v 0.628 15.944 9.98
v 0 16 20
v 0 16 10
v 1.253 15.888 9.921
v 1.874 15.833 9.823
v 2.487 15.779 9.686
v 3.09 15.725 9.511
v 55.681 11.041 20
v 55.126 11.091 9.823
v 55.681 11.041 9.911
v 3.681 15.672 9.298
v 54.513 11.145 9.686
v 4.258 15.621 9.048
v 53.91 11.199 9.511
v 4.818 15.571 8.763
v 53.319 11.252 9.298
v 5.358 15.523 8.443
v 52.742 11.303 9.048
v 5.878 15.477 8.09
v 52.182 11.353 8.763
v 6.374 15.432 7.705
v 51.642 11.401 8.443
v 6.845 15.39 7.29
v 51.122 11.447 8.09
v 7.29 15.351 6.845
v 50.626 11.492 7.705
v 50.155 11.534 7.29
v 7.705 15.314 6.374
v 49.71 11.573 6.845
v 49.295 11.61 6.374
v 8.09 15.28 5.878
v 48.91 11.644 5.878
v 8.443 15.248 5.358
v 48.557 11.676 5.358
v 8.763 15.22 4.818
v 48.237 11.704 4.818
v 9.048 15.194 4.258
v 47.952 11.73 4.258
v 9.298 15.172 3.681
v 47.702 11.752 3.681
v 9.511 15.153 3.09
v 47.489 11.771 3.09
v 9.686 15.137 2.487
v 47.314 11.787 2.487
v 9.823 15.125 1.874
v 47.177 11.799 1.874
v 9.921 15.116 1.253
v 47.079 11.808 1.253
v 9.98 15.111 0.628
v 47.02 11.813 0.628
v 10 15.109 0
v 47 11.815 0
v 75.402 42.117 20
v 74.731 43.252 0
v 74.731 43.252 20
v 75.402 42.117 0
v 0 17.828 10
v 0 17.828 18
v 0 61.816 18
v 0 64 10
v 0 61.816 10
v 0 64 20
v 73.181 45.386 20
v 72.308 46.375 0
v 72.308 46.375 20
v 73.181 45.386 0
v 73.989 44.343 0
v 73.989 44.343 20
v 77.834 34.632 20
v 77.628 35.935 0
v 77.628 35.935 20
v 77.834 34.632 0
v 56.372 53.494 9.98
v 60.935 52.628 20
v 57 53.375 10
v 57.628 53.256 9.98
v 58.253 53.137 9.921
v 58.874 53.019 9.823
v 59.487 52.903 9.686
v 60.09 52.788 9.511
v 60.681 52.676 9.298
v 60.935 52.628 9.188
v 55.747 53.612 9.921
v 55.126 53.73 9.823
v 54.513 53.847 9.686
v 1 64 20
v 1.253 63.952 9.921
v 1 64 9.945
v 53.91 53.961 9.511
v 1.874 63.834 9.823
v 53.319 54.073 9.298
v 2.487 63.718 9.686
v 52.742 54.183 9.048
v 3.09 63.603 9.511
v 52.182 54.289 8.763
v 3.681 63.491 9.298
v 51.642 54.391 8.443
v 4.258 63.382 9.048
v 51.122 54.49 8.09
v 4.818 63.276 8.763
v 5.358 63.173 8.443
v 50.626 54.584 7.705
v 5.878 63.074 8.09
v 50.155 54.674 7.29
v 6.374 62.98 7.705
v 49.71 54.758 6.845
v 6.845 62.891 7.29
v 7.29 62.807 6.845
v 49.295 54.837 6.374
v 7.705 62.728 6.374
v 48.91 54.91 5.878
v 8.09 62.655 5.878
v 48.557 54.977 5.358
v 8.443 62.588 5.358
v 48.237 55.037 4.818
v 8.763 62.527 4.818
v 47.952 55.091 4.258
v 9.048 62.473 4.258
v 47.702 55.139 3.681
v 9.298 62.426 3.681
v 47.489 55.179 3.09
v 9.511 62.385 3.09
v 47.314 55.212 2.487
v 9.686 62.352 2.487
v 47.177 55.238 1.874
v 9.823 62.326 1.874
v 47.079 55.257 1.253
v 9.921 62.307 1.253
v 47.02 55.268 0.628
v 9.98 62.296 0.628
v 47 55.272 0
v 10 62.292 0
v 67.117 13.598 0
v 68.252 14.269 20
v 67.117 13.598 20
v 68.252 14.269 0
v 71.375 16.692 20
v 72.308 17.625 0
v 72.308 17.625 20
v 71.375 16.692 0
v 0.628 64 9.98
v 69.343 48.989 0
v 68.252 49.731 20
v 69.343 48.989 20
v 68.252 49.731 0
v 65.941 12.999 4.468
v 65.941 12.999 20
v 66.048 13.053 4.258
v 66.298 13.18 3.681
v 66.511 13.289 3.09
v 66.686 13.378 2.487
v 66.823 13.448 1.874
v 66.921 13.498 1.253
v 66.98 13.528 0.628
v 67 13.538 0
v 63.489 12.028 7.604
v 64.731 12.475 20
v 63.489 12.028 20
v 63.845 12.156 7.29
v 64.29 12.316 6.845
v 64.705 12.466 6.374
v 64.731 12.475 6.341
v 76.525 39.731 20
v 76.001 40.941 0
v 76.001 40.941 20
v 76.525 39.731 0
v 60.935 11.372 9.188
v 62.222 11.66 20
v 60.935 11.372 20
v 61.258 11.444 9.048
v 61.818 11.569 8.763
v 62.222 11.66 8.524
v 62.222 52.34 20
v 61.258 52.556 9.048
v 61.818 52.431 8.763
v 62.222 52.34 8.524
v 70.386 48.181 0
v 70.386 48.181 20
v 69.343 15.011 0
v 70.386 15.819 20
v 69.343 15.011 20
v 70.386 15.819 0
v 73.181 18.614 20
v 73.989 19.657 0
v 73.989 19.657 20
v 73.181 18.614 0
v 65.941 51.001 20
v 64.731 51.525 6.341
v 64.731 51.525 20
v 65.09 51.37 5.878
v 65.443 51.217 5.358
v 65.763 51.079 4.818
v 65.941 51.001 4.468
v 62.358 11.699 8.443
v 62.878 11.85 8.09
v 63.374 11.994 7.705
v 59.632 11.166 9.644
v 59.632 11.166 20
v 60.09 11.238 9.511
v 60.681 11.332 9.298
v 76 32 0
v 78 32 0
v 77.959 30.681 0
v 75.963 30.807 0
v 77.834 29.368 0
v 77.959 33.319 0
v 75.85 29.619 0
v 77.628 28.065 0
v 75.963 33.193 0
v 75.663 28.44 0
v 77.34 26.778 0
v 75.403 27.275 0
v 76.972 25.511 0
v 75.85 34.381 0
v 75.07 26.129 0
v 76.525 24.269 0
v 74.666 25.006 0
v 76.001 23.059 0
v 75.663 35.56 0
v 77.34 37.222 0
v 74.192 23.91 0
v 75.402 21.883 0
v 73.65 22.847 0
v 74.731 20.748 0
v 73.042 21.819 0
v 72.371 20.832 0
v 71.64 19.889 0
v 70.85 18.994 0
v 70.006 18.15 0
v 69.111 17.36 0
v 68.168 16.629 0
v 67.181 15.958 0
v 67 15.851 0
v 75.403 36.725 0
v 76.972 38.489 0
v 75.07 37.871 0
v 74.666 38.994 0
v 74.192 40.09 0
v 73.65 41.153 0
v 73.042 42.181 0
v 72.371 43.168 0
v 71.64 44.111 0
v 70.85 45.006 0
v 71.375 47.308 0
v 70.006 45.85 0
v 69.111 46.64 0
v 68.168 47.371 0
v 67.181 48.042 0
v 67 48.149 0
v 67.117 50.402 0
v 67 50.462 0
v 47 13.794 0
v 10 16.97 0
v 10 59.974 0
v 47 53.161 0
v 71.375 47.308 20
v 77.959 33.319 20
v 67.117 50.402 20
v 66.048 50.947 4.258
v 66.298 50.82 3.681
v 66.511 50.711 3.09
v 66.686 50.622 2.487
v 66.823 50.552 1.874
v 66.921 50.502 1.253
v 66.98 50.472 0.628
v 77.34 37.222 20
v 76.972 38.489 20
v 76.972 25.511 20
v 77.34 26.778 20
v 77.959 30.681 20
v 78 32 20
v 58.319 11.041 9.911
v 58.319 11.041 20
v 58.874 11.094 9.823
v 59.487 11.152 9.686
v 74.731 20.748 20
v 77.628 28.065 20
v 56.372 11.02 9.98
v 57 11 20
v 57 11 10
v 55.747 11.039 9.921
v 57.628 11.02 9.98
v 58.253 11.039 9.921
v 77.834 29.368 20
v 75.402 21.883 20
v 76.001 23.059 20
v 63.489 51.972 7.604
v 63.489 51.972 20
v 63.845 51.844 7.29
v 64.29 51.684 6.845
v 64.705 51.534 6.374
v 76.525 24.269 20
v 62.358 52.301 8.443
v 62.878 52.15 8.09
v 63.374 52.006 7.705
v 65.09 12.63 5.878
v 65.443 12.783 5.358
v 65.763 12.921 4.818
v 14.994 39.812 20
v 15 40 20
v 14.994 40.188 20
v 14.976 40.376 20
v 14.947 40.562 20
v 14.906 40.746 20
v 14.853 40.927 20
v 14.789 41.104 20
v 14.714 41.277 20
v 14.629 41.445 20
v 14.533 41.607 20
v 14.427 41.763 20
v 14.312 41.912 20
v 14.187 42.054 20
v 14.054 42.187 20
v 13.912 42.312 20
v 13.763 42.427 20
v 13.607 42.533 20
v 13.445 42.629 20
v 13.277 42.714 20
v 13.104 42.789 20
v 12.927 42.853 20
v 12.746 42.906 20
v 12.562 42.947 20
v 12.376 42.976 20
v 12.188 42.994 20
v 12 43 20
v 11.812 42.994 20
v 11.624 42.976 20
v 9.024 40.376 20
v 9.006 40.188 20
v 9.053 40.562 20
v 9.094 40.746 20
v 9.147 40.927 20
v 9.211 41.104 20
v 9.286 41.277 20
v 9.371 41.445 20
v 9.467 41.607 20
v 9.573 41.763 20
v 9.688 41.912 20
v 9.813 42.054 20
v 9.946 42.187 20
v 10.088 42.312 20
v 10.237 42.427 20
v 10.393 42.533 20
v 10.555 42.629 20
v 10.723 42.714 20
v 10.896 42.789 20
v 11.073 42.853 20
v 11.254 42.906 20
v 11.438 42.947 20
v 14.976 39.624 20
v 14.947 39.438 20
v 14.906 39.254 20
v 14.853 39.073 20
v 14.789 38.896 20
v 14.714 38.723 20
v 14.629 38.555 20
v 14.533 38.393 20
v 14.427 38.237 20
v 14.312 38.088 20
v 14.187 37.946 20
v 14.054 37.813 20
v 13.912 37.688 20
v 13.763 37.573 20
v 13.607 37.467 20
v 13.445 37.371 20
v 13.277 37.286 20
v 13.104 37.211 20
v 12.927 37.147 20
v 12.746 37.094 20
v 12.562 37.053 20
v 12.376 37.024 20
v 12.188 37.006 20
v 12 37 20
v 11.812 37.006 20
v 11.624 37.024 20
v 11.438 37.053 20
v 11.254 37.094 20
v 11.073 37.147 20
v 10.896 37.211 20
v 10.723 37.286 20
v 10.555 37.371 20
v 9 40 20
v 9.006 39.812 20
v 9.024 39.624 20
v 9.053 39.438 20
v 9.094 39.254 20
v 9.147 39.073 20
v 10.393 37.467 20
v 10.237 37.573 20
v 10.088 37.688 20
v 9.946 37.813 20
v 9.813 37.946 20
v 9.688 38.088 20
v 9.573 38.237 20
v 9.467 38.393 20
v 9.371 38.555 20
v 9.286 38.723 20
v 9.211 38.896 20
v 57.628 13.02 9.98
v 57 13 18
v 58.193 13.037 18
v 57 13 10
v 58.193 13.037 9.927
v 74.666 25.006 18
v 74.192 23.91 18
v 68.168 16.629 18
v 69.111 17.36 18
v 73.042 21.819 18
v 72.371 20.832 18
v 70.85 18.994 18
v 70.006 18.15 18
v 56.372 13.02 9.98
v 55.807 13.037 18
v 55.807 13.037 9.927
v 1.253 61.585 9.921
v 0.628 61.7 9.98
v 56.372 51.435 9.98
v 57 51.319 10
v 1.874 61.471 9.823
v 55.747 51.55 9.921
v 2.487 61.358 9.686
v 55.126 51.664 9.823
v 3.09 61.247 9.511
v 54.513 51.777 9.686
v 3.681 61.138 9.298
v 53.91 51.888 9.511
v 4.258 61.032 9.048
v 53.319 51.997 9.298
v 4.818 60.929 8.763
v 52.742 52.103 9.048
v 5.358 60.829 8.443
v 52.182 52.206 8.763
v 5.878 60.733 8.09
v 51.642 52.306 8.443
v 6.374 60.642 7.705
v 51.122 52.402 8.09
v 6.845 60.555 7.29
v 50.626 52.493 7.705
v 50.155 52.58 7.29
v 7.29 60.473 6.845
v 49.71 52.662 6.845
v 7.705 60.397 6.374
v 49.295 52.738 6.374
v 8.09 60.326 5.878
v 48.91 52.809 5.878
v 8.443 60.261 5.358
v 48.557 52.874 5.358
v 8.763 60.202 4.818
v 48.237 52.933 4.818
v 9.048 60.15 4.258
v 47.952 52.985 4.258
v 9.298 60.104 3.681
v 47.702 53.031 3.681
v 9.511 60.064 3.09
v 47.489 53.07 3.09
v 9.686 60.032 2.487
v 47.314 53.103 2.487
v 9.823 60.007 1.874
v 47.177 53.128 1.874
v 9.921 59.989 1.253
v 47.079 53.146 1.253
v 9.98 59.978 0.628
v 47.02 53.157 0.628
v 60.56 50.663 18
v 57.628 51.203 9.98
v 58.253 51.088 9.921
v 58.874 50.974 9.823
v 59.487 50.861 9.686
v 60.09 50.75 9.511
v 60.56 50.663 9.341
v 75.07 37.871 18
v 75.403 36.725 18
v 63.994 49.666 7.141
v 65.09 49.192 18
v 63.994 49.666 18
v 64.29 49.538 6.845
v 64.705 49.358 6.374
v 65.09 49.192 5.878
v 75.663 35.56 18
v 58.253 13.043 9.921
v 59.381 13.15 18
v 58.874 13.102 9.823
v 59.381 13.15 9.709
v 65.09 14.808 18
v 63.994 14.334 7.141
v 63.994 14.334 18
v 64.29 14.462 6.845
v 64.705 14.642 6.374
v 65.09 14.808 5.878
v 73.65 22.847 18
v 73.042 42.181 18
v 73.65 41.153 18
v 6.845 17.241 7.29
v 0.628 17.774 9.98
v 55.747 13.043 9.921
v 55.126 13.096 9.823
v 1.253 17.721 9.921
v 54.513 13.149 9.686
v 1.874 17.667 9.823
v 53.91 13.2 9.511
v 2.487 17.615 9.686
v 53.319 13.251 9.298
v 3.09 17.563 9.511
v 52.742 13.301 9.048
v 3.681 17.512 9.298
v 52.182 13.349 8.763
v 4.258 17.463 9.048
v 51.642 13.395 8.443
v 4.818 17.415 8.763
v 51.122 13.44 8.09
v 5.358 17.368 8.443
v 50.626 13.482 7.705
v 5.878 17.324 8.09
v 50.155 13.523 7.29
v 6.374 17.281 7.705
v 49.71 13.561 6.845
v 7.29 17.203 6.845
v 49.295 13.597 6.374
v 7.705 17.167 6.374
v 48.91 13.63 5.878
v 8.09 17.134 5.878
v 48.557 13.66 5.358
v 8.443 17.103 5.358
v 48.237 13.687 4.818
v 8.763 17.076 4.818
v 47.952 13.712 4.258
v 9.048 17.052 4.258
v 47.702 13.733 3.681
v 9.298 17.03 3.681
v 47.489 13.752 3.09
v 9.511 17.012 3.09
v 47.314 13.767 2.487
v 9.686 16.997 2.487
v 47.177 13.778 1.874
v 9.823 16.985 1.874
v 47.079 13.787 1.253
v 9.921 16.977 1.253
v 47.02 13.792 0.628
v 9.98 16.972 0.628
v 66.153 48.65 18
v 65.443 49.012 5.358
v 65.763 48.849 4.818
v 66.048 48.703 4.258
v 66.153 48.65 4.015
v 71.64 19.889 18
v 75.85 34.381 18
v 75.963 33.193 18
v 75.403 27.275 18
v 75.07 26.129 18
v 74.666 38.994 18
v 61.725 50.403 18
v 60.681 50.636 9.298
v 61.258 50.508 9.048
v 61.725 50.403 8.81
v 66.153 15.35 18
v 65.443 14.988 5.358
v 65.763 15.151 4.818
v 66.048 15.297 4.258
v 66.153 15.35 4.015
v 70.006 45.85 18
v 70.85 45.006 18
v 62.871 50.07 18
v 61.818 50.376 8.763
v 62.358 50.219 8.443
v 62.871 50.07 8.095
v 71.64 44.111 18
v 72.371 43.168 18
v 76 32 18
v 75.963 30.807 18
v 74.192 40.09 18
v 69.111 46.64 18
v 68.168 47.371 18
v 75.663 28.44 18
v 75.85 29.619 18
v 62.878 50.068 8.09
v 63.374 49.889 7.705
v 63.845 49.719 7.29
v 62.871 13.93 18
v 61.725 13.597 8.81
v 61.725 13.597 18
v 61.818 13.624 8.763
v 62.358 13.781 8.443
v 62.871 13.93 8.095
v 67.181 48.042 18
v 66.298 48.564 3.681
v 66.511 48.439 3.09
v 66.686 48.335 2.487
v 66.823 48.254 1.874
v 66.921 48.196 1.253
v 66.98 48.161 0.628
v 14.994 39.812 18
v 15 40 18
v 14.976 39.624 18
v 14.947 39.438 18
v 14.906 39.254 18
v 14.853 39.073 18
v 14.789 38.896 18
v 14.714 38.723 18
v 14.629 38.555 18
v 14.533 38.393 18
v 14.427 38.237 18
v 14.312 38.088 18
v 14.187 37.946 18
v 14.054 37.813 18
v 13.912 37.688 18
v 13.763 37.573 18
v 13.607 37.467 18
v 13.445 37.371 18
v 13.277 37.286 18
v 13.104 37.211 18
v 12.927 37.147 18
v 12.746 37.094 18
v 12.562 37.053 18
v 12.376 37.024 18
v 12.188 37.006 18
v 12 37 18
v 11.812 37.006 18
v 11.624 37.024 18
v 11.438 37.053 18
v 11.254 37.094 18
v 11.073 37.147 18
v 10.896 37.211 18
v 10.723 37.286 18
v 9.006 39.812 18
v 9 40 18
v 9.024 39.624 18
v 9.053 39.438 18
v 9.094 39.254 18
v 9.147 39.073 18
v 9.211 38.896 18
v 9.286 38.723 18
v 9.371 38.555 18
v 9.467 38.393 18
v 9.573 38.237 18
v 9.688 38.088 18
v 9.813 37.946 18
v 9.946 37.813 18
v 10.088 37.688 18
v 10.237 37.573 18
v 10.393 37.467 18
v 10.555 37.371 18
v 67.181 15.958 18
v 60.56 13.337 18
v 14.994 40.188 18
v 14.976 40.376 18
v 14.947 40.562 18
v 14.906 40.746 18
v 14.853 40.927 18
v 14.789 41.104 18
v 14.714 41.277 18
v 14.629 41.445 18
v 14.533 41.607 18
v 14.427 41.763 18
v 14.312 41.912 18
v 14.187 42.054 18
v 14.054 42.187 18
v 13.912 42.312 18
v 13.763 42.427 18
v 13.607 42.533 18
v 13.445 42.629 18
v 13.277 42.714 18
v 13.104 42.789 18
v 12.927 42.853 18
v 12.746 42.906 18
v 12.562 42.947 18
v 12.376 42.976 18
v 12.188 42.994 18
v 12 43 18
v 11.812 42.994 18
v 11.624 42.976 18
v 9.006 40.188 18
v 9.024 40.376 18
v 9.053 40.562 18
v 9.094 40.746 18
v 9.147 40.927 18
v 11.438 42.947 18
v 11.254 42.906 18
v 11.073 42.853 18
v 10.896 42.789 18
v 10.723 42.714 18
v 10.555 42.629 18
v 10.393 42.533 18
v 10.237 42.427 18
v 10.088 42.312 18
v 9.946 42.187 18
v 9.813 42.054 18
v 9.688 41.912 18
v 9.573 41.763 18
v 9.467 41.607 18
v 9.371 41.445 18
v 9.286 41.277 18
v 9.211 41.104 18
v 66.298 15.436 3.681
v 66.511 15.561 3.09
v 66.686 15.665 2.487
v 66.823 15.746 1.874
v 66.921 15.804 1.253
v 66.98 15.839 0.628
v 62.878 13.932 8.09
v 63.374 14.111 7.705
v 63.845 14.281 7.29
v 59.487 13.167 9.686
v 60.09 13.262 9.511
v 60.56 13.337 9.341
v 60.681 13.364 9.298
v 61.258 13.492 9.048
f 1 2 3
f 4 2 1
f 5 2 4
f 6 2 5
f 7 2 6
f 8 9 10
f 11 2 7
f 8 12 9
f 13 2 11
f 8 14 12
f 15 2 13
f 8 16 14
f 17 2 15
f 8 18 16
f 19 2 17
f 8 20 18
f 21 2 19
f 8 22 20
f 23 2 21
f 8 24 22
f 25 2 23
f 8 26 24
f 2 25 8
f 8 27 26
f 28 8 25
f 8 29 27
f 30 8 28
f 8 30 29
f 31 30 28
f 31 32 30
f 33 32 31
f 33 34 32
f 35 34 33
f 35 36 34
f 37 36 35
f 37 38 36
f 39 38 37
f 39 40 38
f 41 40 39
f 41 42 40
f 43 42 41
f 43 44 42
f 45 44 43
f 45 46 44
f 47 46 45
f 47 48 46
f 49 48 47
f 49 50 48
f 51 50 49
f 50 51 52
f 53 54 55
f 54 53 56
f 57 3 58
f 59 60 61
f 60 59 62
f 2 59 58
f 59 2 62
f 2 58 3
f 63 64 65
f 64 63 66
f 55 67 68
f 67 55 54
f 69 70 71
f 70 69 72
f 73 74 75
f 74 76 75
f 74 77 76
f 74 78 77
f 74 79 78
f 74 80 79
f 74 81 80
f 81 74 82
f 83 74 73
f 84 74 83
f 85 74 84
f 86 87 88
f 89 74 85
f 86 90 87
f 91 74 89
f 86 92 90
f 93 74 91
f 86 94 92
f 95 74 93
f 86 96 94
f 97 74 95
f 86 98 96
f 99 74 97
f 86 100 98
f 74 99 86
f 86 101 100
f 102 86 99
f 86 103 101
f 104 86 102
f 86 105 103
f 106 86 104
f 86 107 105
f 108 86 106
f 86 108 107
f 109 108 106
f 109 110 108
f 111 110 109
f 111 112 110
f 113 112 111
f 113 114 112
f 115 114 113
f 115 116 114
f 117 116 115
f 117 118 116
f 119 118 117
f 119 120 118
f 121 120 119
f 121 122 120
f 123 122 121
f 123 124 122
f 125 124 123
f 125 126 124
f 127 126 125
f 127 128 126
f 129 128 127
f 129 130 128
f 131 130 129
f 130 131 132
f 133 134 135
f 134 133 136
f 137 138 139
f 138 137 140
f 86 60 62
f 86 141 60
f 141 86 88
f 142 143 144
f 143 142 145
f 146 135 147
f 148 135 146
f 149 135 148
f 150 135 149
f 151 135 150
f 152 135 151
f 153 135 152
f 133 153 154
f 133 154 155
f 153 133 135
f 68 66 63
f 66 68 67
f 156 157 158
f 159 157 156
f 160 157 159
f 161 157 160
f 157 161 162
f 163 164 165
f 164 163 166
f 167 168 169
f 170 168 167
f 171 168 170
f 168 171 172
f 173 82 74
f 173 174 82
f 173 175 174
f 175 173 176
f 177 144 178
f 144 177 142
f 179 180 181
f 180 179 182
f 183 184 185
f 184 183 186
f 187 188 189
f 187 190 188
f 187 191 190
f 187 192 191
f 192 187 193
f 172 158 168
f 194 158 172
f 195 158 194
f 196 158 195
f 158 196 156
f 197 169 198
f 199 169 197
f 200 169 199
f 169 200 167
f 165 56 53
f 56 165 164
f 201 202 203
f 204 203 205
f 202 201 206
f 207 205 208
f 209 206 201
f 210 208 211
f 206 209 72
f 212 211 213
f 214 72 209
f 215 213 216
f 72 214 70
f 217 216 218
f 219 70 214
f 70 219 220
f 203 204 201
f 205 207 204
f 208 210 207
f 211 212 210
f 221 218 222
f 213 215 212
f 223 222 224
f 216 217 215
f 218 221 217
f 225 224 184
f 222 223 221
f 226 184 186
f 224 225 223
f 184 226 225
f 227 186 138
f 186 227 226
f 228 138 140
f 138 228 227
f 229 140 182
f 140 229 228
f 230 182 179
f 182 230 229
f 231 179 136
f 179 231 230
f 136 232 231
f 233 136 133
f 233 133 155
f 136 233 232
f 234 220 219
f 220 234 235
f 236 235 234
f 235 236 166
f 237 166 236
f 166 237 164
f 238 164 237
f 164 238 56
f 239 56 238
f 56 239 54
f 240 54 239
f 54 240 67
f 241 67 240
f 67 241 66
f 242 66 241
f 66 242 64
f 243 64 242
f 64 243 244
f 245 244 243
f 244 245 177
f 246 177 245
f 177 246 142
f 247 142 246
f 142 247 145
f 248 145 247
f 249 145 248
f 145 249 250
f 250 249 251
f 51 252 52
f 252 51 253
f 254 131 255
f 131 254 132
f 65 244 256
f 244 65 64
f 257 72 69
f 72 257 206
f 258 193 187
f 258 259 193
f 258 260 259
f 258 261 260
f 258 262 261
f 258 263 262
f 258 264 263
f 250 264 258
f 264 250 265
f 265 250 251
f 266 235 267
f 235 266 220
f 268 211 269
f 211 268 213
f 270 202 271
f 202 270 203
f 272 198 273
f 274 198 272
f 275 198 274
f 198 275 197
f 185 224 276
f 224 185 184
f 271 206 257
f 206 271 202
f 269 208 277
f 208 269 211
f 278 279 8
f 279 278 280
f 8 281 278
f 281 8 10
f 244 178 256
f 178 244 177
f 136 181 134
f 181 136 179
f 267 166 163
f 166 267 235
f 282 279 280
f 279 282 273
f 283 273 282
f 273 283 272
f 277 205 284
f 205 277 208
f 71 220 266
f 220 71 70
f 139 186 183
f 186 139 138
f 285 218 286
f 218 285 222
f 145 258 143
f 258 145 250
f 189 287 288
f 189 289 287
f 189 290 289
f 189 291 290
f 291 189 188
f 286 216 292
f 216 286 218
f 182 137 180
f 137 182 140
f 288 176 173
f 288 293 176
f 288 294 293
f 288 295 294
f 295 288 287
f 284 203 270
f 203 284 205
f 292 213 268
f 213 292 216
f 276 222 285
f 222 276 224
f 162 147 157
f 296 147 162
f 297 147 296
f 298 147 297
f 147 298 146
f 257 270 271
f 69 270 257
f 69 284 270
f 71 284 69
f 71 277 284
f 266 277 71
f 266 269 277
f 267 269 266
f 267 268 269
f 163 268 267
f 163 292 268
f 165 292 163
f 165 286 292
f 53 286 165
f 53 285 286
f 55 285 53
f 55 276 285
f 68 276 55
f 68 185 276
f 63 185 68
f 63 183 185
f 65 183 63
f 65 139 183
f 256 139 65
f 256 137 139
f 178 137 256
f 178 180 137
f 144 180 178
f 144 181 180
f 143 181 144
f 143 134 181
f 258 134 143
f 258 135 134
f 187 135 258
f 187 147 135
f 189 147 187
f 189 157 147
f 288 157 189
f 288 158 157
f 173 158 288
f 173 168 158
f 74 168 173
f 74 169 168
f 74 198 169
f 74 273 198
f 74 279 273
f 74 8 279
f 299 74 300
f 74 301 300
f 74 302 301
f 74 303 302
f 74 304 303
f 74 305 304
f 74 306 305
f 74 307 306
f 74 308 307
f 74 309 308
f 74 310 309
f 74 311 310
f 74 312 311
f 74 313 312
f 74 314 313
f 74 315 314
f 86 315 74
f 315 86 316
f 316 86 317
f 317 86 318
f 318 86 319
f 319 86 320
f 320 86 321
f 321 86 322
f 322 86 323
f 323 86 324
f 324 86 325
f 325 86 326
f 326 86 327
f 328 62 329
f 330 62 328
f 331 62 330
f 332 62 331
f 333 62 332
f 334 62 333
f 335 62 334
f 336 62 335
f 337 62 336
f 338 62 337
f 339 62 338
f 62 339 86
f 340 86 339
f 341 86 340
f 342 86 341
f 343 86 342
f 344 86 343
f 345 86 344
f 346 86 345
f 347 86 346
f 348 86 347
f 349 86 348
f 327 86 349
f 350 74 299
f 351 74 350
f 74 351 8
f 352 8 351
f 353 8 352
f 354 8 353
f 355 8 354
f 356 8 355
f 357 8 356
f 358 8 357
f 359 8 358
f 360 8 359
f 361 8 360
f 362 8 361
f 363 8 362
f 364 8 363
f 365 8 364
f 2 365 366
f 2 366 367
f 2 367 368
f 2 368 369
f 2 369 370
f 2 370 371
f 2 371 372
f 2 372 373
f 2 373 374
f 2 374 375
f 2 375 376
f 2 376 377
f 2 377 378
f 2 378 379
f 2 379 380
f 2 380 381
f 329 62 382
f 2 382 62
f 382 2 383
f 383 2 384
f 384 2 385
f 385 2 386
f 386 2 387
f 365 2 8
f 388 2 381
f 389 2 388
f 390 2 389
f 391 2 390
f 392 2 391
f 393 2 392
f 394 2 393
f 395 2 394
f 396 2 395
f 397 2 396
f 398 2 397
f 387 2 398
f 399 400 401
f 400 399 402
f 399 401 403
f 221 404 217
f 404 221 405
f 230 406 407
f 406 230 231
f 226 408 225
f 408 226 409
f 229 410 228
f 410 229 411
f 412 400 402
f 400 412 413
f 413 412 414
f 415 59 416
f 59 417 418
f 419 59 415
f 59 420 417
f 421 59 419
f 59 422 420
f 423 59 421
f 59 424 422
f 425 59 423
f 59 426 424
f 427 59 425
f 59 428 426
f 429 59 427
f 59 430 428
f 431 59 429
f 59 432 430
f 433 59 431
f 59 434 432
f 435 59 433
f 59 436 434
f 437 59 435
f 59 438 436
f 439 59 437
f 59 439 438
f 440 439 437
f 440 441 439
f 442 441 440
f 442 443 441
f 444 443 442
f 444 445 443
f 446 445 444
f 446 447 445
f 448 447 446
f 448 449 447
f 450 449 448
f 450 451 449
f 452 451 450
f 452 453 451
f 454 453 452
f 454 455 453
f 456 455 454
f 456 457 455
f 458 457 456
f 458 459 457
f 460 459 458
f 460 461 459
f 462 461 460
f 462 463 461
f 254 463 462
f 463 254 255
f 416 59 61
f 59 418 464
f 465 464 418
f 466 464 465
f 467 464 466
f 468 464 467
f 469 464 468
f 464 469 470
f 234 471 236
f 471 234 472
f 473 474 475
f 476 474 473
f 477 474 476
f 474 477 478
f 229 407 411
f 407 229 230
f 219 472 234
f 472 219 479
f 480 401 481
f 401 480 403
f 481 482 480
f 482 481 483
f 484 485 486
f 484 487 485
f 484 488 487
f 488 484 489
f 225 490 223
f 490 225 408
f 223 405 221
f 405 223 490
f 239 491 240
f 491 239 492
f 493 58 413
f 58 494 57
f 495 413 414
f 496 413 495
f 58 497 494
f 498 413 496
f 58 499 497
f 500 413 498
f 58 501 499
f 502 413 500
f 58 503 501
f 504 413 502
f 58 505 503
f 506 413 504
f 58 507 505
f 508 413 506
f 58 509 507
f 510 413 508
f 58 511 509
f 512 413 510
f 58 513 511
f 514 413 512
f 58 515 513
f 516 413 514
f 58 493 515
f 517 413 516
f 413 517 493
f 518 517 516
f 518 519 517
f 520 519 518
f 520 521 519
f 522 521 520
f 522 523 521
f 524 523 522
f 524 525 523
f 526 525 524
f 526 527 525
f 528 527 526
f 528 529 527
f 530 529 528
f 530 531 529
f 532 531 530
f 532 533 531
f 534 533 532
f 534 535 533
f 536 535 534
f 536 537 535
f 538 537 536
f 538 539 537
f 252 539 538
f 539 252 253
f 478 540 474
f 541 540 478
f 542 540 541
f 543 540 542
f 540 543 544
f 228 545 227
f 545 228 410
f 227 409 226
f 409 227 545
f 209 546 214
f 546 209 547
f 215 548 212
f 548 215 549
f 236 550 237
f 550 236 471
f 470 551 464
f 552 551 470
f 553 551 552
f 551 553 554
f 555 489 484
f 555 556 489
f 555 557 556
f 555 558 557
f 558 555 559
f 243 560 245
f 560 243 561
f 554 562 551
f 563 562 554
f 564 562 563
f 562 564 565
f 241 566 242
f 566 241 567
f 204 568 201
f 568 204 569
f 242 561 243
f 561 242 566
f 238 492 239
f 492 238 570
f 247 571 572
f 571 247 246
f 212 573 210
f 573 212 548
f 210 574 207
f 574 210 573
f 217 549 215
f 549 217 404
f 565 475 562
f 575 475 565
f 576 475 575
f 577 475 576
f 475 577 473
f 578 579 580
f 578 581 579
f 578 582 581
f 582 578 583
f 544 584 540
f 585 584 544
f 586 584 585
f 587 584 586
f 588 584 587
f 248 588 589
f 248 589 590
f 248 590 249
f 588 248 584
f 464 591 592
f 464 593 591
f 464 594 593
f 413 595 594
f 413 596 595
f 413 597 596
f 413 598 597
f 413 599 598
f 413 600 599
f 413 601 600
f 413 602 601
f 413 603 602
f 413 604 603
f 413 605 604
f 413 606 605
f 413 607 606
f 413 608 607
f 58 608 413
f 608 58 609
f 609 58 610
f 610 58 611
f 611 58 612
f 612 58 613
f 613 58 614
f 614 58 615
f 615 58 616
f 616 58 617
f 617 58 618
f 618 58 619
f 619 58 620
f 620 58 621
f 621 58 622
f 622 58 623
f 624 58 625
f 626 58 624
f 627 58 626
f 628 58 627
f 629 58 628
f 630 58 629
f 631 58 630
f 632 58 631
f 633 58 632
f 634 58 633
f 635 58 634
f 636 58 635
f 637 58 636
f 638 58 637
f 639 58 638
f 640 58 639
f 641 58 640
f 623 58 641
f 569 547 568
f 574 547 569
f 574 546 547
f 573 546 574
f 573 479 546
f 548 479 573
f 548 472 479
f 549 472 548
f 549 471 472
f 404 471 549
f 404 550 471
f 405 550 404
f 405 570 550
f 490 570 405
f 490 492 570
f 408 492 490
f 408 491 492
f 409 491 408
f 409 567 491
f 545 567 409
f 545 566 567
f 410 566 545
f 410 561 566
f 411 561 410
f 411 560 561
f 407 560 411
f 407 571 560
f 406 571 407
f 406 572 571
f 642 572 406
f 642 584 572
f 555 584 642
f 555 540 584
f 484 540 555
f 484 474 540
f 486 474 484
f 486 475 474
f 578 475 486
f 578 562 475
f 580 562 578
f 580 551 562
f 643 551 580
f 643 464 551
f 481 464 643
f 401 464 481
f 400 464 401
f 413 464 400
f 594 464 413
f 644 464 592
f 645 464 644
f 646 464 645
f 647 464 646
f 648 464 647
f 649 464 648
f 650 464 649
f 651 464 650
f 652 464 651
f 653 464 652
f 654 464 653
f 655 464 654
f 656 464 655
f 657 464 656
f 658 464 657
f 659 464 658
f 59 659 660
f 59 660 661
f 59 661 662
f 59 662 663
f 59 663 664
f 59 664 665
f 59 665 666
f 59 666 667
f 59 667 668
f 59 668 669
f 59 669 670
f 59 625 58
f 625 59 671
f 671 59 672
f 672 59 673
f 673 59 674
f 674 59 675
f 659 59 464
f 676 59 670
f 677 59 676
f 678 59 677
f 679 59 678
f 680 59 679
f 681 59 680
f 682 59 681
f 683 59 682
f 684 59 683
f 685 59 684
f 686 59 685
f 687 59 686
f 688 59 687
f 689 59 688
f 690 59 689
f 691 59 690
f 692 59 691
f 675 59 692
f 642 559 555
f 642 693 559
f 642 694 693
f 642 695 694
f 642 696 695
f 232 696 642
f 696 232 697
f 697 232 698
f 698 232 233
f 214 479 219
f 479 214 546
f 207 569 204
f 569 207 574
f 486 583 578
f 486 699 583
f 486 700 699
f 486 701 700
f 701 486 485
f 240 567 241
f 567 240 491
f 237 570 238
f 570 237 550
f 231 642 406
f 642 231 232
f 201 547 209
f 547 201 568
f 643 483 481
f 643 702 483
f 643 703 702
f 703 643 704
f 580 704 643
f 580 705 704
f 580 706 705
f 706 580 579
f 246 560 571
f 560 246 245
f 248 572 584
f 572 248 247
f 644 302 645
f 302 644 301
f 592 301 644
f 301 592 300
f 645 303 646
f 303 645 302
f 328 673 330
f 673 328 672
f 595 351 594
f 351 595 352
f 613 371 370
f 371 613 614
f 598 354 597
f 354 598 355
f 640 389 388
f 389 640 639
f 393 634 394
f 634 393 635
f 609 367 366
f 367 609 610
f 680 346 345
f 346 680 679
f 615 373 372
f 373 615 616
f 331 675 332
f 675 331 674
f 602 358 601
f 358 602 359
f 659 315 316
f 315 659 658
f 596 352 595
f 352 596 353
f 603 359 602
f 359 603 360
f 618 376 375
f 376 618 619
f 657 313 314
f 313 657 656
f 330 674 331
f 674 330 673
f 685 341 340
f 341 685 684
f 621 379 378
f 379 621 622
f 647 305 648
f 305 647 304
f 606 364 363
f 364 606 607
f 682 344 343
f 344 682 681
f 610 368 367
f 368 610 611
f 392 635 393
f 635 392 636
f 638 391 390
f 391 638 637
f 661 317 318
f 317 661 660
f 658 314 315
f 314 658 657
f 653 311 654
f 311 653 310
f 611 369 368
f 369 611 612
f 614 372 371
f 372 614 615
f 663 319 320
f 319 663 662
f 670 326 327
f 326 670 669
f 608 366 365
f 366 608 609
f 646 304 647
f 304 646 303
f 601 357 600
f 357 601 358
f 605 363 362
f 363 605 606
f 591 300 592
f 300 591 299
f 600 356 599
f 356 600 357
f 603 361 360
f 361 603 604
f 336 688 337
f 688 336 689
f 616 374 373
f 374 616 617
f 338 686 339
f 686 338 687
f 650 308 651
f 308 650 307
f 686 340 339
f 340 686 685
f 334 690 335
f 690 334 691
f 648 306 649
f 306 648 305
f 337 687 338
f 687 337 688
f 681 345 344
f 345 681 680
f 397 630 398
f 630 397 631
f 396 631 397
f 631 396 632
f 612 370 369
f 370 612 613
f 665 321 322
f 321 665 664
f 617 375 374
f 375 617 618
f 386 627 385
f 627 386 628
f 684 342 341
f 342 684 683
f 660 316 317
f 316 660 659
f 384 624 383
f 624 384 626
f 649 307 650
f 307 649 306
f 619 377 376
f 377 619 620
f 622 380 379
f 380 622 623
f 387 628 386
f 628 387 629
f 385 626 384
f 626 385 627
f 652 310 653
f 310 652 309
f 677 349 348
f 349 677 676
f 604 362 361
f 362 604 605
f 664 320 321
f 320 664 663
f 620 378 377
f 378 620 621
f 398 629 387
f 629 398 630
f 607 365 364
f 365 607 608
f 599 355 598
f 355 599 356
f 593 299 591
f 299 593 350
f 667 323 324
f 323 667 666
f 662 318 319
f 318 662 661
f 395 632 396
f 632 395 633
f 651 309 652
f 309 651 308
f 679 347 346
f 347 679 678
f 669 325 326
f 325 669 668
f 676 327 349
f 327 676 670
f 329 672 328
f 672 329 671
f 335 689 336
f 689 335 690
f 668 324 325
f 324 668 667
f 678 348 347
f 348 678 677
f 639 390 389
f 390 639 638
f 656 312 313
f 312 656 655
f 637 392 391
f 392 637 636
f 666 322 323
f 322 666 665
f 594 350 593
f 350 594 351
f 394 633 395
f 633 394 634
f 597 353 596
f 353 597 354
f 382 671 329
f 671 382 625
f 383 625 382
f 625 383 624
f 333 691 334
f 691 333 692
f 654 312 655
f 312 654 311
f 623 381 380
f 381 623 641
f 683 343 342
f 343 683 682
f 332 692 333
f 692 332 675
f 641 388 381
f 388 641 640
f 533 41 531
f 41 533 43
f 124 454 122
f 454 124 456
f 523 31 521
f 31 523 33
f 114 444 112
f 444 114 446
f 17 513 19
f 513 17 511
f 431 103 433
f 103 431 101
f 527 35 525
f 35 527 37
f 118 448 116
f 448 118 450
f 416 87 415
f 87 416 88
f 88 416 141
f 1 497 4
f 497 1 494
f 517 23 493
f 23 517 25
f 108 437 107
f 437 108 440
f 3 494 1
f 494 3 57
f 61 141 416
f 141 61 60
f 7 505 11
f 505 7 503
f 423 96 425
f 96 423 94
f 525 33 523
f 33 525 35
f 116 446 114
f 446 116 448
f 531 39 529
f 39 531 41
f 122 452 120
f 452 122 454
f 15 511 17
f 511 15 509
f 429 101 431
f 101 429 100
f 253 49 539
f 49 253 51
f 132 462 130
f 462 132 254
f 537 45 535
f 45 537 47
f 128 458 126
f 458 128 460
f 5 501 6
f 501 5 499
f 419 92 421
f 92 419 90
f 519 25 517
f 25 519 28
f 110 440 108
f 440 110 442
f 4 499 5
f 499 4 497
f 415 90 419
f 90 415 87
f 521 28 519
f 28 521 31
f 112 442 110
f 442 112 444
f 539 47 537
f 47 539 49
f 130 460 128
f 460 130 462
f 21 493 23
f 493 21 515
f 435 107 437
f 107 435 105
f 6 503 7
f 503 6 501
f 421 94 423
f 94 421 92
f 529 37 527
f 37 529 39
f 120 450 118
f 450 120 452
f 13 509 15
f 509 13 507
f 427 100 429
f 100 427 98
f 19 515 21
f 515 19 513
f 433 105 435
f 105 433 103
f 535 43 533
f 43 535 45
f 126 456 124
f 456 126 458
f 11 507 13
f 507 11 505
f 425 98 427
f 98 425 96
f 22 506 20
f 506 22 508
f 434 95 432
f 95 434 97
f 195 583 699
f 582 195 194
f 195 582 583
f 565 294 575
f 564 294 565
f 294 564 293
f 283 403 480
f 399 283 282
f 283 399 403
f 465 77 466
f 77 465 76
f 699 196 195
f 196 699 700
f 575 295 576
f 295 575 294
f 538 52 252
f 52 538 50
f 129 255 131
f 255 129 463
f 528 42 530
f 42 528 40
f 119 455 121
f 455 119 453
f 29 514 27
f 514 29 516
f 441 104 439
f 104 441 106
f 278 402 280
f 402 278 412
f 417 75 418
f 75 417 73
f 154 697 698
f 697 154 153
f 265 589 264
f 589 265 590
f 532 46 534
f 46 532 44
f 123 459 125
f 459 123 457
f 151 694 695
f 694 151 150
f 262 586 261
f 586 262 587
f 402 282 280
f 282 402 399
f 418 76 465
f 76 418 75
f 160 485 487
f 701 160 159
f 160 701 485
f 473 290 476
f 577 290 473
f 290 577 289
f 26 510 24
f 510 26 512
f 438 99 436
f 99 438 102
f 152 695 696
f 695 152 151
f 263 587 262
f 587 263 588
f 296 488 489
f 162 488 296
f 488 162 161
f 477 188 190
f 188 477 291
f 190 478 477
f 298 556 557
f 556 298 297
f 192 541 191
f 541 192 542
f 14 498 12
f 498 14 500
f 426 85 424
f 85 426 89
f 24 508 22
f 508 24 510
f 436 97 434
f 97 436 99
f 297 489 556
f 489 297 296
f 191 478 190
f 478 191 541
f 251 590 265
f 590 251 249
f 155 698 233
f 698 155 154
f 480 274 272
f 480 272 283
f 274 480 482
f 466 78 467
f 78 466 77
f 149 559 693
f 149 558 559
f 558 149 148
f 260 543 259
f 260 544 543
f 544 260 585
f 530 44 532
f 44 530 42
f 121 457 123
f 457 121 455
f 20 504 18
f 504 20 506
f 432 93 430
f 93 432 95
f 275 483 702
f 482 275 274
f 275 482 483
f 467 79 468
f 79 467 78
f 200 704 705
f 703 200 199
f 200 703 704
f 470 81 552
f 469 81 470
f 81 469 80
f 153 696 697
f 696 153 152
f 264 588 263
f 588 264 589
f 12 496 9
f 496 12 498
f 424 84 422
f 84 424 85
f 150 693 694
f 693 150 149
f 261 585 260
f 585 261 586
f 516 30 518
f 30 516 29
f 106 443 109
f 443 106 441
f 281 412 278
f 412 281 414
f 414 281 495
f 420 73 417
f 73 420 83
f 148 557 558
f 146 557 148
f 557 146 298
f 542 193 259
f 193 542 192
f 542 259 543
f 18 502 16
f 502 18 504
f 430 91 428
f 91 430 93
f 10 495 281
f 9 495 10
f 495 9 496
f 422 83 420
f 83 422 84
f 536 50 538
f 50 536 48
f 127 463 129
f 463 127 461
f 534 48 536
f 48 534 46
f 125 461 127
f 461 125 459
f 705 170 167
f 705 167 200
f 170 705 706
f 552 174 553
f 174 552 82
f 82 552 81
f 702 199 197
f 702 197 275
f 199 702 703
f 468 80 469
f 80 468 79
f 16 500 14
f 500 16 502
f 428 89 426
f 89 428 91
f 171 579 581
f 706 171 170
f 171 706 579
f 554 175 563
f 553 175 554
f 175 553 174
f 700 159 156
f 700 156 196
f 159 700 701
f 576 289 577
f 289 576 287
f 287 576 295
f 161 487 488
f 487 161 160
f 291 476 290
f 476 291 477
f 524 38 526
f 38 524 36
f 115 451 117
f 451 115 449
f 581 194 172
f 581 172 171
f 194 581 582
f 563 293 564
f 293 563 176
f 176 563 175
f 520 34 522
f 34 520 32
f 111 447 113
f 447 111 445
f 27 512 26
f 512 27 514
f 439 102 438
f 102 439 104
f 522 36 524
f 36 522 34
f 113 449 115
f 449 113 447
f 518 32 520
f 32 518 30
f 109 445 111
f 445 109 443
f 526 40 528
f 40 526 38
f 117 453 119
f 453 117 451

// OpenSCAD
//============================================================
// Project Pathe Baby
//
// Vincent DUBOIS
//============================================================

/*
	I've 2 Pathe Baby (9.5mm projector)
	This piece miss one, but the 2 Baby are not compatible.

	So, I build the cache missing.
	May be different form one Pathe Baby to another
	Must be adapt for other pathe Baby.
	Pathe Baby are black, print it black if you can.
	Else, paint it black.

	English is not my natural tongue, sorry for the "fautes".
*/

//------------------------------------------------------------
// Parameters in millimeter - Recommended values see comment
//------------------------------------------------------------
$fn = 100 ;		// OpenScad Resolution
Epsilon = 0.15 ;	// by definition Printer resolution

Thikness = 2 ;	// Thikness of Pathe Baby plate

// Approximatively, 
Plate_Height = 20;

// Axe position
// From the left corner of the mecanic bloc
// [0,0,0] is the corner position so it's now easy to build
Axe1_position = [12,40,0];
Axe2_position = [57,32,0];

// Diameter of each wheel
Wheel1_Diameter = 32;
Wheel2_Diameter = 30;
Wheel1_Radius = Wheel1_Diameter/2;
Wheel2_Radius = Wheel2_Diameter/2;

// Hole for the axe for fixing the cache
// Apparently the same for each Pathe Baby
Hole_Diameter = 6;
Hole_Radius = Hole_Diameter/2;

// This corner of the Baby is rounded
// I decide to eliminate material for simplicity
Chanfrain = 10;

//------------------------------------------------------------
View_Protection();


//------------------------------------------------------------
// Create Base
//------------------------------------------------------------
/*
	I use the HULL to build it from a cube and a cylinder
	The piece is exactly what I expected
*/
module Plate_Base()
{
	hull()
	{
		translate([0,Wheel1_Diameter/2,0])
			cube([1,Wheel1_Radius*3,Plate_Height]);
		translate(Axe2_position)
			cylinder
			(
				r=Wheel2_Radius+3*Thikness,
				h=Plate_Height,
				center=false
			);
	}
}

//------------------------------------------------------------
// Plate Empty
//------------------------------------------------------------
/*
	Same as above but for emptying the bloc
	Thikness is used
*/
module Plate_Empty()
{
translate([0,0,-Thikness])
hull()
{
	translate([-Thikness,Wheel1_Diameter/2+Thikness,0])
		cube([1,Wheel1_Radius*3-2*Thikness,Plate_Height]);
	translate(Axe2_position)
		cylinder
		(
			r=Wheel2_Radius+2*Thikness,
			h=Plate_Height,
			center=false
		);
}
}

//------------------------------------------------------------
// Module Plate Cache
//------------------------------------------------------------
/*
	All assembled
*/
module Plate_Cache()
{
	difference()
	{
		Plate_Base();
		Plate_Empty();
		translate(Axe1_position)
			cylinder
			(
				r=Hole_Radius,
				h=Plate_Height+Epsilon,
				center=false
			);
		translate([0,2*Wheel1_Diameter,0])
			rotate([90,90,0])
				cylinder
				(
					r=Chanfrain,
					h=4*Wheel1_Diameter,
					center=true
				);
		// option, there is it one my other Pathe Baby
		translate(Axe2_position)
			rotate([90,90,0])
				cylinder
				(
					r=Chanfrain,
					h=4*Wheel1_Diameter,
					center=true
				);
	}

}

//------------------------------------------------------------
// View Whell
//------------------------------------------------------------
/*
	If needed, to see the wheels, so I know if the plate fit or not
*/
module View_Wheel()
{
	translate(Axe1_position)
	#cylinder
	(
		r=Wheel1_Radius,
		h=Plate_Height,
		center=false
	);
	translate(Axe2_position)
	#cylinder
	(
		r=Wheel2_Radius,
		h=Plate_Height,
		center=false
	);
}

//------------------------------------------------------------
// View
//------------------------------------------------------------
/*
	The rotation is here befor export to STL.
	So when you import it on the printer the piece is in good
	position to be printed.
*/
module View_Protection()
{
//	rotate([180,0,0])
	{
		//View_Wheel();
		//color("black")
		Plate_Cache();
	}
}

//==EOF=======================================================
